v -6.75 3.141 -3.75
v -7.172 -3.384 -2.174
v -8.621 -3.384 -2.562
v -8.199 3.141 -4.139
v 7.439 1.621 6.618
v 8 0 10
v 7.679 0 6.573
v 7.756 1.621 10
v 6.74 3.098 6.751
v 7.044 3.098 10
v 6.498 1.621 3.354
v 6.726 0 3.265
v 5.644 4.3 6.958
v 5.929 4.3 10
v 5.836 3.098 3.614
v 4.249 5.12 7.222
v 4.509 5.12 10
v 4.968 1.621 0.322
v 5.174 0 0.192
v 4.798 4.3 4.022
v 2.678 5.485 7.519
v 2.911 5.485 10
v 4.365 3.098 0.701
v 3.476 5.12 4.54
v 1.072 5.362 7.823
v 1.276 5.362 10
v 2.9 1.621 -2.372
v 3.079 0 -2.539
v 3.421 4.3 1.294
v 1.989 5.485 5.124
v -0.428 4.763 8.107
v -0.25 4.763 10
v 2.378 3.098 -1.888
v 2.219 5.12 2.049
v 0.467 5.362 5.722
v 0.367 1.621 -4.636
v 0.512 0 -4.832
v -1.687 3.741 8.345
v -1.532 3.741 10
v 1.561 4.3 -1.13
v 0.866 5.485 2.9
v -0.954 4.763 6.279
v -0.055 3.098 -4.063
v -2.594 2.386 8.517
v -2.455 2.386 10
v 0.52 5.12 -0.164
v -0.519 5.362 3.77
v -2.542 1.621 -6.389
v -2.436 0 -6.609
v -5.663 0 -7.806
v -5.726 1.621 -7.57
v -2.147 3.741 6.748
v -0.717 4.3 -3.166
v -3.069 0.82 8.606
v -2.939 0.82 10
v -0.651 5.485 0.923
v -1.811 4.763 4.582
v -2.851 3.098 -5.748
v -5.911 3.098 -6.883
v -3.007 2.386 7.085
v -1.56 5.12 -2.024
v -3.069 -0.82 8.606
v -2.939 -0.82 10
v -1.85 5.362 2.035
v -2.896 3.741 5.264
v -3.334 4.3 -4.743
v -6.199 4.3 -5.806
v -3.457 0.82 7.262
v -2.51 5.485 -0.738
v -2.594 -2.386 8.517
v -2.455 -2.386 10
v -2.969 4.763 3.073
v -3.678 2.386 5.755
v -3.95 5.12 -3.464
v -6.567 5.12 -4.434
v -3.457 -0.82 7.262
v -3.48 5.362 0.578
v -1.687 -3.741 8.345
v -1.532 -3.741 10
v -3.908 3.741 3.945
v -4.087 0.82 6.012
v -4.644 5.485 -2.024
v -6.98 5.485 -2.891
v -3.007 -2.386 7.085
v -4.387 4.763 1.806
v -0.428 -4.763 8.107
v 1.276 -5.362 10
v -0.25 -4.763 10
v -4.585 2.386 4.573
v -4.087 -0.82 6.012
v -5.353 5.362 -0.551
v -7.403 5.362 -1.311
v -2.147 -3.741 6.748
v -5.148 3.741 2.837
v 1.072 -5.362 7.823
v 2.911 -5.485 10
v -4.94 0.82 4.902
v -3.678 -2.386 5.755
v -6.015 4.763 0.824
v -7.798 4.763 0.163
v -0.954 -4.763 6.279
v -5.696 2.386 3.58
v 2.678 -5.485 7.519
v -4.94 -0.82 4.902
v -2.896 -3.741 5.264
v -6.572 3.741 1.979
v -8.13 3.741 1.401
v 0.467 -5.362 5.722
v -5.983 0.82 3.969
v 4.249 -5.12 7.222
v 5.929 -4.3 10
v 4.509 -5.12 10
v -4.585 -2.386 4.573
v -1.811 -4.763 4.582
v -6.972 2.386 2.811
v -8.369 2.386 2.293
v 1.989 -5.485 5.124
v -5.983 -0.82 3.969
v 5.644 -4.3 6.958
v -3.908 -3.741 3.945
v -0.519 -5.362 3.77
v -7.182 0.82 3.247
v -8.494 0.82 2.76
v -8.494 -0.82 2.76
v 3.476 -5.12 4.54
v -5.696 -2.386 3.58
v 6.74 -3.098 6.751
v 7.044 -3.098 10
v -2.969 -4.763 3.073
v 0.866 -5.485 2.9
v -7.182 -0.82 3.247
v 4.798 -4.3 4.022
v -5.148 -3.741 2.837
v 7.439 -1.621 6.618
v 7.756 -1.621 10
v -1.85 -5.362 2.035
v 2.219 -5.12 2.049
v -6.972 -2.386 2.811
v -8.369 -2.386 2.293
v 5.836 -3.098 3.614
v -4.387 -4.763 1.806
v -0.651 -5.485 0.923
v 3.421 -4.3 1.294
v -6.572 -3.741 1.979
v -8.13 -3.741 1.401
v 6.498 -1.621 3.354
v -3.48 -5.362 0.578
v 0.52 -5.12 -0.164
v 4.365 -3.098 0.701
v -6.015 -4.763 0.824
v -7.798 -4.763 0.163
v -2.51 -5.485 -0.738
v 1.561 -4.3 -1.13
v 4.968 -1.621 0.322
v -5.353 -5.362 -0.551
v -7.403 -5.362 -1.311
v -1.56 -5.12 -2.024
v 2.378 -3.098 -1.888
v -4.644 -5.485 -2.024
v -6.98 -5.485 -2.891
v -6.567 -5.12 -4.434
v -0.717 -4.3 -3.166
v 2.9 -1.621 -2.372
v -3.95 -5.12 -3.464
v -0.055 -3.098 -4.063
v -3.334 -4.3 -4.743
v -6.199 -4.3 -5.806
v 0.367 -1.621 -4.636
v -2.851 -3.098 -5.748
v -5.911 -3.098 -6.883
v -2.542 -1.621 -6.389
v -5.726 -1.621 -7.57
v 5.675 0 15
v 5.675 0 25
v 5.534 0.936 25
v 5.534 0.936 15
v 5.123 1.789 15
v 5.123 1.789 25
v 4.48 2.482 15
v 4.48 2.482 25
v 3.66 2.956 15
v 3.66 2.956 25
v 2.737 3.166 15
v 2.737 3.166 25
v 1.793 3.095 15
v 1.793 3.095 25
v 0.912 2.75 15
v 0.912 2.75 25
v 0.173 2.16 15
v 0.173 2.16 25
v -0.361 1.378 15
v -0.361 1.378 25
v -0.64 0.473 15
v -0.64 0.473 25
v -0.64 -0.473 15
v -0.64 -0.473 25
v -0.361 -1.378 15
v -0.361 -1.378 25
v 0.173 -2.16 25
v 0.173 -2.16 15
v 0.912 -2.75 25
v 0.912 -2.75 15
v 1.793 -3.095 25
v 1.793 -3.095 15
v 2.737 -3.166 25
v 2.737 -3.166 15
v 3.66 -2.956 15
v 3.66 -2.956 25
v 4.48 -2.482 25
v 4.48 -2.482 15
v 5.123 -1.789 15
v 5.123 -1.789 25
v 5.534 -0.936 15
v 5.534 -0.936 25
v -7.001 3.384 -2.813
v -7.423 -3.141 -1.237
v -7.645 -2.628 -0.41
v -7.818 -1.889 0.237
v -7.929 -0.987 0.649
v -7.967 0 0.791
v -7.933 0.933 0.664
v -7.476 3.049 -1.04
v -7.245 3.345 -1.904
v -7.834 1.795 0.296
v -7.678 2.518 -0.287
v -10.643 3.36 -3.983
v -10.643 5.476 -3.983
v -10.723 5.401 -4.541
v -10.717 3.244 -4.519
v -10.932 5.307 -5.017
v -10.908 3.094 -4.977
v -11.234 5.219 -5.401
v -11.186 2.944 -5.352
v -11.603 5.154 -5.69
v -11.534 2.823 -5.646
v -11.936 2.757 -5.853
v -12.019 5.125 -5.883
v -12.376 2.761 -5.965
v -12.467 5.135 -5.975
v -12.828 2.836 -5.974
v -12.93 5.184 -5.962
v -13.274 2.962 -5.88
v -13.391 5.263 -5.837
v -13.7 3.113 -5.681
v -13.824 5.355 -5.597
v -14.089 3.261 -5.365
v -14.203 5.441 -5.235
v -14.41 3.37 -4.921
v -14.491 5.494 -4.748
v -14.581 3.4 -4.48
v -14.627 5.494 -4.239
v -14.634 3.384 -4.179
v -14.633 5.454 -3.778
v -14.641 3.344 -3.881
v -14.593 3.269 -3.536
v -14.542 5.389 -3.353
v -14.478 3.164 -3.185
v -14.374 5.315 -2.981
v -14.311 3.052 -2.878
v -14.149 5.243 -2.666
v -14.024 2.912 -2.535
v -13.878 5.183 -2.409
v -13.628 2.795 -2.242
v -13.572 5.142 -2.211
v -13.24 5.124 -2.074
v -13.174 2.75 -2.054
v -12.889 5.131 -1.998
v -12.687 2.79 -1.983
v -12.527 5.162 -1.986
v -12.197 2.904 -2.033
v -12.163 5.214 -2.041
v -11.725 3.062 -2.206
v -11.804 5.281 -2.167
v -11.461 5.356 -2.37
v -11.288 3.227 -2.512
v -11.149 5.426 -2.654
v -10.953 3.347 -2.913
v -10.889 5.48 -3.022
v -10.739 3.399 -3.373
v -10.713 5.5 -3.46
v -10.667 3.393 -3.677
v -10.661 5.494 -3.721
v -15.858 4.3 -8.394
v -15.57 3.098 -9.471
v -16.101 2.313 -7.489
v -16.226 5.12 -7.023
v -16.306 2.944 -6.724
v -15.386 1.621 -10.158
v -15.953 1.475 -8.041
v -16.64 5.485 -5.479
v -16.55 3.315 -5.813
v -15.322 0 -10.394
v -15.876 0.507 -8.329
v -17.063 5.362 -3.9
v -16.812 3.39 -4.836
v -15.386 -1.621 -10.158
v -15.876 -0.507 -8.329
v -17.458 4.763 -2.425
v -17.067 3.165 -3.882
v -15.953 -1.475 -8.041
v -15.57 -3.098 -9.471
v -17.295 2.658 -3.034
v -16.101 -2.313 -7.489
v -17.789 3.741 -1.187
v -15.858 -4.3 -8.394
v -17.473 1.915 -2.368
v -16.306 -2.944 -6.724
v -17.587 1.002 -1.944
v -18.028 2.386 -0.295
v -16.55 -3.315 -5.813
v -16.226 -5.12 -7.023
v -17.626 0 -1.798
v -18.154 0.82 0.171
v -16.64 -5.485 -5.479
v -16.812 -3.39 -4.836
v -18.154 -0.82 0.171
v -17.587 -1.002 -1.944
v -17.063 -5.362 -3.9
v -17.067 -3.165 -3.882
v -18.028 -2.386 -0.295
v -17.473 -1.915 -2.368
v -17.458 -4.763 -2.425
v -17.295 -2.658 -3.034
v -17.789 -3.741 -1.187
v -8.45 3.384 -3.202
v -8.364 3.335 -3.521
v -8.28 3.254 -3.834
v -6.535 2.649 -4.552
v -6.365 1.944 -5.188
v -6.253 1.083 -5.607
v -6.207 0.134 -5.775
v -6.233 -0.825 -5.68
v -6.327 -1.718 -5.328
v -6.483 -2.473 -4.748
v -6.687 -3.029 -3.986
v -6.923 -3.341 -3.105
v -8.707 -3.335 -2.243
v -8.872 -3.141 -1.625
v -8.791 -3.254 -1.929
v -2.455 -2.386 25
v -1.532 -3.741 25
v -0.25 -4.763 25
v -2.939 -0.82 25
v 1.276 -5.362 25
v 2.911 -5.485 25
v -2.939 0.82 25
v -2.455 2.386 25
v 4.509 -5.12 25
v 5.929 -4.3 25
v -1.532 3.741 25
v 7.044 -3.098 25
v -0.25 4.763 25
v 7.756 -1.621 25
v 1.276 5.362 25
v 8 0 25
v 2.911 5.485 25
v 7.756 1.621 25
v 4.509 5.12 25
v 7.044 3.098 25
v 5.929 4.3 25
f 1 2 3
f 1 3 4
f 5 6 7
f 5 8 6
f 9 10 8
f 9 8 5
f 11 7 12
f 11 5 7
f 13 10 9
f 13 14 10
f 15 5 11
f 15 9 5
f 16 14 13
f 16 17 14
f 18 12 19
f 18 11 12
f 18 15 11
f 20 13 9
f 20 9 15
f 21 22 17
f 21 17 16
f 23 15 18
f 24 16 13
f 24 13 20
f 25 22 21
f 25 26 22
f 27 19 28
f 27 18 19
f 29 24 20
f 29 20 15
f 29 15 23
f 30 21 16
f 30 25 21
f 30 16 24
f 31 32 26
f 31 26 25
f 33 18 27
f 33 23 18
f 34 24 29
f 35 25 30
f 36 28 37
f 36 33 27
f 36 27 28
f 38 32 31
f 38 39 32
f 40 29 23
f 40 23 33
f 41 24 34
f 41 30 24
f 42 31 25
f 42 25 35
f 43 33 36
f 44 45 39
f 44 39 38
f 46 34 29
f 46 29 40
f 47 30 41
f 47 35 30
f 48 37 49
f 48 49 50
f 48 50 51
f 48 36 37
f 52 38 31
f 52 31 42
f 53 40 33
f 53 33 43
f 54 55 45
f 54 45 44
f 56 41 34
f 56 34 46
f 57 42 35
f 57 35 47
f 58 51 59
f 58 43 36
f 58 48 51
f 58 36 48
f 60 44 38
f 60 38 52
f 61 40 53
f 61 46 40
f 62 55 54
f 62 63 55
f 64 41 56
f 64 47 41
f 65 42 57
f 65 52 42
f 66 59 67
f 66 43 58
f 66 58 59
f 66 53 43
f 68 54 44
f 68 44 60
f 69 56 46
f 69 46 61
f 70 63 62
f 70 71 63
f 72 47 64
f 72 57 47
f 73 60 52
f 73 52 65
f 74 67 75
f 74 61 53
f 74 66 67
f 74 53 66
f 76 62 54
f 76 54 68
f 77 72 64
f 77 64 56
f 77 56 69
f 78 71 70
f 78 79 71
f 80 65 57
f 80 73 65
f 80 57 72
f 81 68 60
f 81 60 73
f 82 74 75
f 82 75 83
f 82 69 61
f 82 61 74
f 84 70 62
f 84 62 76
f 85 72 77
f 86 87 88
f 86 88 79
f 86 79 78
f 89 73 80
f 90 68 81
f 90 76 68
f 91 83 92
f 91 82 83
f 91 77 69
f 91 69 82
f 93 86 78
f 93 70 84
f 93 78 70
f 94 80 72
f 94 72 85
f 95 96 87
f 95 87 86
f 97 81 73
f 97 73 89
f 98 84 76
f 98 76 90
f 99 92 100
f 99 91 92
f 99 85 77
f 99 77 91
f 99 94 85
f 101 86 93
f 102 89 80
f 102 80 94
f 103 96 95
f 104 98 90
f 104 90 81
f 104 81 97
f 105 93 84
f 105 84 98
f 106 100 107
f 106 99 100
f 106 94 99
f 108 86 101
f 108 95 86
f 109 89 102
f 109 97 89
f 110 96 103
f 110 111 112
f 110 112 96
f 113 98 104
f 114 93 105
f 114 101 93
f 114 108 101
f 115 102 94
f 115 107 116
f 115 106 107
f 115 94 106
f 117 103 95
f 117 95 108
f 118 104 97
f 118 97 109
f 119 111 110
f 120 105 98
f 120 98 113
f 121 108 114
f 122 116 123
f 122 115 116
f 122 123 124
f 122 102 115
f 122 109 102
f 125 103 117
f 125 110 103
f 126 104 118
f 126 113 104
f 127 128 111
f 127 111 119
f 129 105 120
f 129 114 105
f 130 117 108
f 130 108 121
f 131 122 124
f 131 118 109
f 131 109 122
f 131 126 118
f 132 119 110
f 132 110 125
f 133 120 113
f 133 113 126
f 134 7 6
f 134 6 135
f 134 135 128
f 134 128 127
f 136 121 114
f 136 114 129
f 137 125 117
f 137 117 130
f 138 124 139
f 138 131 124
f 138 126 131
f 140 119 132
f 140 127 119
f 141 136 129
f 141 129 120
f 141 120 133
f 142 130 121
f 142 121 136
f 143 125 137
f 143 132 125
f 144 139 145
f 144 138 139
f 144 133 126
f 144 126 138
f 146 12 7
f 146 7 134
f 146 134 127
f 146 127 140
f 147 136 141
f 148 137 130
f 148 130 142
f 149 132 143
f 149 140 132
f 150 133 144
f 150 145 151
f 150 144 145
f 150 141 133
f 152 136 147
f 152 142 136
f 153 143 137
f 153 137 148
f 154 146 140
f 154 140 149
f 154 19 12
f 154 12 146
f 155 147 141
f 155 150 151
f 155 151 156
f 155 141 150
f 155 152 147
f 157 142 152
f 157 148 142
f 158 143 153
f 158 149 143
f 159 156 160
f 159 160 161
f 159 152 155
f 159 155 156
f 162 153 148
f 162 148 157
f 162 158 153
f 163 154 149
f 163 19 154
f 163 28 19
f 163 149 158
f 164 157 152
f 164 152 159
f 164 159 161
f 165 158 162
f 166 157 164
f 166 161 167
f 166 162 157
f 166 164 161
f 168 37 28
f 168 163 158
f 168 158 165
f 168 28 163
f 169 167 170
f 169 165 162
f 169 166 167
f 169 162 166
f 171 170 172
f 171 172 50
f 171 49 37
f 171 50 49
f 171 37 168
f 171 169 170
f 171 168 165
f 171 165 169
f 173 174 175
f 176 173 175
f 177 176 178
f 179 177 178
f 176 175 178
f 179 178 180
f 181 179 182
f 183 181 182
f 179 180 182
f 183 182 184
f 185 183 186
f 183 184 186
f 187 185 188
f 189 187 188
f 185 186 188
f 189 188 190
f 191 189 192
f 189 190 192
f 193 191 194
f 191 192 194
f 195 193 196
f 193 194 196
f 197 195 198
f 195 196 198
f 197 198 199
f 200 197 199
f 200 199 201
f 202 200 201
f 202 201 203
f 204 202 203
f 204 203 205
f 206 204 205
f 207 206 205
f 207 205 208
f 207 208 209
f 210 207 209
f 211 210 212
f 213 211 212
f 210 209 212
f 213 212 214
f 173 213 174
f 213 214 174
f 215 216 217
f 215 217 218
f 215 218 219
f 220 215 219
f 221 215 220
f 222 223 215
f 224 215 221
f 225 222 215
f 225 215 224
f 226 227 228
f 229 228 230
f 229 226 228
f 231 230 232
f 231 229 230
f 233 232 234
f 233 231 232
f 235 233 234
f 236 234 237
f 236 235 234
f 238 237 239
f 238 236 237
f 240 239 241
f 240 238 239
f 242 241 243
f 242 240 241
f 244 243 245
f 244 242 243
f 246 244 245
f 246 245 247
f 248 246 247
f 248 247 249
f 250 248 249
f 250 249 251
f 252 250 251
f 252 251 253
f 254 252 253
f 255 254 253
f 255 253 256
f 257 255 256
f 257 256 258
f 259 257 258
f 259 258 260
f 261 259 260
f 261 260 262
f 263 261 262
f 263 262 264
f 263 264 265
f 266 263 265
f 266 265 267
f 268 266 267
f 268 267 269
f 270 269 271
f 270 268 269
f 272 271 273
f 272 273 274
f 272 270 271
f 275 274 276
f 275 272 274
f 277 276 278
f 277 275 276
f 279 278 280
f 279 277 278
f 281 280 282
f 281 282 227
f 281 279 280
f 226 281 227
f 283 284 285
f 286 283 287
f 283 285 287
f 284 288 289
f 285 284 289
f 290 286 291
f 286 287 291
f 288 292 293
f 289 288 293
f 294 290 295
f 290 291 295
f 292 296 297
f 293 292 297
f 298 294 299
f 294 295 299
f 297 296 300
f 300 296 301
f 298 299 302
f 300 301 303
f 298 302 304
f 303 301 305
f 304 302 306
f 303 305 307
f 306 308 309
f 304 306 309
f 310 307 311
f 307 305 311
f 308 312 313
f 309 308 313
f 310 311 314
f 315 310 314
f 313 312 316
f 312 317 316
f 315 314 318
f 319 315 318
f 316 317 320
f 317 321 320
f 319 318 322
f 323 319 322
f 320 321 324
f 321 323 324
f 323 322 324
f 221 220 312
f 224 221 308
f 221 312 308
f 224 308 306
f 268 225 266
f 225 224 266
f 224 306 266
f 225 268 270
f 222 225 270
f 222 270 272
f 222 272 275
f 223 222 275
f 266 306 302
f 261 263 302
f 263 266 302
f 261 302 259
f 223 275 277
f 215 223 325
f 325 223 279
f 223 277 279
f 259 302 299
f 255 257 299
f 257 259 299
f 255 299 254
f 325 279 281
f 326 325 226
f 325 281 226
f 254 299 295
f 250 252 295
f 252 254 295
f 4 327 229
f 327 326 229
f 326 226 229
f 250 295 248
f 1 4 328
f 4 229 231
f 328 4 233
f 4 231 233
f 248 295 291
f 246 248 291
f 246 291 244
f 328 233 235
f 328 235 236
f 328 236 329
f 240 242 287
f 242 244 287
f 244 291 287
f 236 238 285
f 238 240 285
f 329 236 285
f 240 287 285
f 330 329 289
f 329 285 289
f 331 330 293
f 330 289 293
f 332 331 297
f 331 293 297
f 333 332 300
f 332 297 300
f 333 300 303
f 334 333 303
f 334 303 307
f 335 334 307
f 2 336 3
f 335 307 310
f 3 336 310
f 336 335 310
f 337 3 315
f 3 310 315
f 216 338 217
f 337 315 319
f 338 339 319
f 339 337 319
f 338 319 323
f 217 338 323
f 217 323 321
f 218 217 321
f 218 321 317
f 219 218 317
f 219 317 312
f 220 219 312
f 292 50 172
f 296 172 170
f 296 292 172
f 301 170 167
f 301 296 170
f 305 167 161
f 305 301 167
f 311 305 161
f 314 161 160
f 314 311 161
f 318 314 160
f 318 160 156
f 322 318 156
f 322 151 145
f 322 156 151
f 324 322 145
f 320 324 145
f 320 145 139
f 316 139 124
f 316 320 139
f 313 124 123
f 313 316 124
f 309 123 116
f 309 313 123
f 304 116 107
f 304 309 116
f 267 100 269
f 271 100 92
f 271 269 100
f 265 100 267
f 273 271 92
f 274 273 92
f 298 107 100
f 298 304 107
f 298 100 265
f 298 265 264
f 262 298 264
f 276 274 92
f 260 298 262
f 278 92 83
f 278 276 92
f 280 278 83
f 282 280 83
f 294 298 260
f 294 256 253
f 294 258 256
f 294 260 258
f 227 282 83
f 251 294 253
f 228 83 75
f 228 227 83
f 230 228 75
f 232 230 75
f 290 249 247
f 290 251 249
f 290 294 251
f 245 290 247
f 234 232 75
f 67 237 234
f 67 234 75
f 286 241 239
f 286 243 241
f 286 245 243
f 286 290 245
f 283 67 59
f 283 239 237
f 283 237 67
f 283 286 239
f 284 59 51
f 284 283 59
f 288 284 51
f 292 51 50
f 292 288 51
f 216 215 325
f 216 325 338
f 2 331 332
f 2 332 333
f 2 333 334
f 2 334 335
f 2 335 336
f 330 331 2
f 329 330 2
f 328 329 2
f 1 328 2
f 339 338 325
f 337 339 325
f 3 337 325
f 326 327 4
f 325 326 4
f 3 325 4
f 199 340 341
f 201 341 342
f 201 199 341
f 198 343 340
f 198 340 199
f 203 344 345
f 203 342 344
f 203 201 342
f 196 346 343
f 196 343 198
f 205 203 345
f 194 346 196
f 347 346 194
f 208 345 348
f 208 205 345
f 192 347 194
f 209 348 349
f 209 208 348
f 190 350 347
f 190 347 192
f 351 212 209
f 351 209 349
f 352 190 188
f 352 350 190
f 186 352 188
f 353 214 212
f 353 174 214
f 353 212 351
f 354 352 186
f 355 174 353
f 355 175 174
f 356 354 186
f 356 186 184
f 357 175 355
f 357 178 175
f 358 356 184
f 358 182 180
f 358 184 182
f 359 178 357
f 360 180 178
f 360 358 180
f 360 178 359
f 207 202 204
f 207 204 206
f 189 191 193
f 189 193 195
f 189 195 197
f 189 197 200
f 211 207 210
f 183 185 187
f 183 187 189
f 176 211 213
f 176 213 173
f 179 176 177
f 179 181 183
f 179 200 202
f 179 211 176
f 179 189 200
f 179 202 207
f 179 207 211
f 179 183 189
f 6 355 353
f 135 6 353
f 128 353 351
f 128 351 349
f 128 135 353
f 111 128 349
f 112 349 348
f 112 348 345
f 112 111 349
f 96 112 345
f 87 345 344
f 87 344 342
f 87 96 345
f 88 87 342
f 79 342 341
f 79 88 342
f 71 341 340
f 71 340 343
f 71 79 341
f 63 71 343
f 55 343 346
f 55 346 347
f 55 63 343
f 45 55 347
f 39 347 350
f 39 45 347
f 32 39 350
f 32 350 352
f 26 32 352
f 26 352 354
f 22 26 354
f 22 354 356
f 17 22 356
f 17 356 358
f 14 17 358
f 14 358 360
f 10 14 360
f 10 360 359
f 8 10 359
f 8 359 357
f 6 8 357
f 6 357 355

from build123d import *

# Parameters (mm, degrees)
SKETCH4_R           = 5.5
SKETCH6_R           = 3.175
HOLE_SHAFT_DEPTH    = 10
SKETCH7_R           = 3.4
HOLE_POT_DEPTH      = 10
SKETCH8_R           = 2
HOLE_INSERT_DEPTH   = 6.5000001
BOSS_EXTRUDE3_DEPTH = 1.5


with BuildPart() as part:
    # Sweep2: sweep along a path in PROFILE
    with BuildLine(Plane(origin=(0, 0, 0), x_dir=(1, 0, 0), z_dir=(0, 1, 0))) as sweep2_path:
        Line((2.5, -25), (2.5, -10))
        ThreePointArc((2.5, -10), (-0.172829853, -2.126097159), (-7.086656691, 2.49357424))
        Line((-7.086656691, 2.49357424), (-16.745914953, 5.081764691))
    # Sketch4 → Sweep2 (sweep)
    with BuildSketch(Plane.XY.offset(25)):
        with Locations((2.5, 0)):
            Circle(SKETCH4_R)
    sweep(path=sweep2_path.line)

    # Sketch6 → HOLE_SHAFT (cut)
    with BuildSketch(Plane.XY.offset(25)):
        with Locations((2.5, 0)):
            Circle(SKETCH6_R)
    extrude(amount=-HOLE_SHAFT_DEPTH, mode=Mode.SUBTRACT)

    # Sketch7 → HOLE_POT (cut)
    with BuildSketch(Plane(origin=(-16.894592529, 0, -4.526892425), x_dir=(-0.258819045, 0, 0.965925826), z_dir=(-0.965925826, 0, -0.258819045))):
        with Locations((-0.57444604, 0)):
            Circle(SKETCH7_R)
    extrude(amount=-HOLE_POT_DEPTH, mode=Mode.SUBTRACT)

    # Sketch8 → HOLE_INSERT (cut, through all)
    with BuildSketch(Plane(origin=(0, 0, 0), x_dir=(1, 0, 0), z_dir=(0, 1, 0))):
        with Locations((-12.643487424, 3.982522547)):
            Circle(SKETCH8_R)
    extrude(amount=HOLE_INSERT_DEPTH, mode=Mode.SUBTRACT)

    # Sketch11 → Boss-Extrude3 (add)
    with BuildSketch(Plane(origin=(-7.235334266, 0, -1.938701974), x_dir=(-0.258819045, 0, 0.965925826), z_dir=(-0.965925826, 0, -0.258819045))):
        with BuildLine():
            Line((-0.905457853, 3.383848575), (0.72667763, -3.141190411))
            ThreePointArc((0.72667763, -3.141190411), (0.250591719, -3.298380314), (-0.243434227, -3.383848575))
            Line((-0.243434227, -3.383848575), (-1.87556971, 3.141190411))
            ThreePointArc((-1.87556971, 3.141190411), (-1.3994838, 3.298380314), (-0.905457853, 3.383848575))
        make_face()
    extrude(amount=BOSS_EXTRUDE3_DEPTH)


solid = part.part
